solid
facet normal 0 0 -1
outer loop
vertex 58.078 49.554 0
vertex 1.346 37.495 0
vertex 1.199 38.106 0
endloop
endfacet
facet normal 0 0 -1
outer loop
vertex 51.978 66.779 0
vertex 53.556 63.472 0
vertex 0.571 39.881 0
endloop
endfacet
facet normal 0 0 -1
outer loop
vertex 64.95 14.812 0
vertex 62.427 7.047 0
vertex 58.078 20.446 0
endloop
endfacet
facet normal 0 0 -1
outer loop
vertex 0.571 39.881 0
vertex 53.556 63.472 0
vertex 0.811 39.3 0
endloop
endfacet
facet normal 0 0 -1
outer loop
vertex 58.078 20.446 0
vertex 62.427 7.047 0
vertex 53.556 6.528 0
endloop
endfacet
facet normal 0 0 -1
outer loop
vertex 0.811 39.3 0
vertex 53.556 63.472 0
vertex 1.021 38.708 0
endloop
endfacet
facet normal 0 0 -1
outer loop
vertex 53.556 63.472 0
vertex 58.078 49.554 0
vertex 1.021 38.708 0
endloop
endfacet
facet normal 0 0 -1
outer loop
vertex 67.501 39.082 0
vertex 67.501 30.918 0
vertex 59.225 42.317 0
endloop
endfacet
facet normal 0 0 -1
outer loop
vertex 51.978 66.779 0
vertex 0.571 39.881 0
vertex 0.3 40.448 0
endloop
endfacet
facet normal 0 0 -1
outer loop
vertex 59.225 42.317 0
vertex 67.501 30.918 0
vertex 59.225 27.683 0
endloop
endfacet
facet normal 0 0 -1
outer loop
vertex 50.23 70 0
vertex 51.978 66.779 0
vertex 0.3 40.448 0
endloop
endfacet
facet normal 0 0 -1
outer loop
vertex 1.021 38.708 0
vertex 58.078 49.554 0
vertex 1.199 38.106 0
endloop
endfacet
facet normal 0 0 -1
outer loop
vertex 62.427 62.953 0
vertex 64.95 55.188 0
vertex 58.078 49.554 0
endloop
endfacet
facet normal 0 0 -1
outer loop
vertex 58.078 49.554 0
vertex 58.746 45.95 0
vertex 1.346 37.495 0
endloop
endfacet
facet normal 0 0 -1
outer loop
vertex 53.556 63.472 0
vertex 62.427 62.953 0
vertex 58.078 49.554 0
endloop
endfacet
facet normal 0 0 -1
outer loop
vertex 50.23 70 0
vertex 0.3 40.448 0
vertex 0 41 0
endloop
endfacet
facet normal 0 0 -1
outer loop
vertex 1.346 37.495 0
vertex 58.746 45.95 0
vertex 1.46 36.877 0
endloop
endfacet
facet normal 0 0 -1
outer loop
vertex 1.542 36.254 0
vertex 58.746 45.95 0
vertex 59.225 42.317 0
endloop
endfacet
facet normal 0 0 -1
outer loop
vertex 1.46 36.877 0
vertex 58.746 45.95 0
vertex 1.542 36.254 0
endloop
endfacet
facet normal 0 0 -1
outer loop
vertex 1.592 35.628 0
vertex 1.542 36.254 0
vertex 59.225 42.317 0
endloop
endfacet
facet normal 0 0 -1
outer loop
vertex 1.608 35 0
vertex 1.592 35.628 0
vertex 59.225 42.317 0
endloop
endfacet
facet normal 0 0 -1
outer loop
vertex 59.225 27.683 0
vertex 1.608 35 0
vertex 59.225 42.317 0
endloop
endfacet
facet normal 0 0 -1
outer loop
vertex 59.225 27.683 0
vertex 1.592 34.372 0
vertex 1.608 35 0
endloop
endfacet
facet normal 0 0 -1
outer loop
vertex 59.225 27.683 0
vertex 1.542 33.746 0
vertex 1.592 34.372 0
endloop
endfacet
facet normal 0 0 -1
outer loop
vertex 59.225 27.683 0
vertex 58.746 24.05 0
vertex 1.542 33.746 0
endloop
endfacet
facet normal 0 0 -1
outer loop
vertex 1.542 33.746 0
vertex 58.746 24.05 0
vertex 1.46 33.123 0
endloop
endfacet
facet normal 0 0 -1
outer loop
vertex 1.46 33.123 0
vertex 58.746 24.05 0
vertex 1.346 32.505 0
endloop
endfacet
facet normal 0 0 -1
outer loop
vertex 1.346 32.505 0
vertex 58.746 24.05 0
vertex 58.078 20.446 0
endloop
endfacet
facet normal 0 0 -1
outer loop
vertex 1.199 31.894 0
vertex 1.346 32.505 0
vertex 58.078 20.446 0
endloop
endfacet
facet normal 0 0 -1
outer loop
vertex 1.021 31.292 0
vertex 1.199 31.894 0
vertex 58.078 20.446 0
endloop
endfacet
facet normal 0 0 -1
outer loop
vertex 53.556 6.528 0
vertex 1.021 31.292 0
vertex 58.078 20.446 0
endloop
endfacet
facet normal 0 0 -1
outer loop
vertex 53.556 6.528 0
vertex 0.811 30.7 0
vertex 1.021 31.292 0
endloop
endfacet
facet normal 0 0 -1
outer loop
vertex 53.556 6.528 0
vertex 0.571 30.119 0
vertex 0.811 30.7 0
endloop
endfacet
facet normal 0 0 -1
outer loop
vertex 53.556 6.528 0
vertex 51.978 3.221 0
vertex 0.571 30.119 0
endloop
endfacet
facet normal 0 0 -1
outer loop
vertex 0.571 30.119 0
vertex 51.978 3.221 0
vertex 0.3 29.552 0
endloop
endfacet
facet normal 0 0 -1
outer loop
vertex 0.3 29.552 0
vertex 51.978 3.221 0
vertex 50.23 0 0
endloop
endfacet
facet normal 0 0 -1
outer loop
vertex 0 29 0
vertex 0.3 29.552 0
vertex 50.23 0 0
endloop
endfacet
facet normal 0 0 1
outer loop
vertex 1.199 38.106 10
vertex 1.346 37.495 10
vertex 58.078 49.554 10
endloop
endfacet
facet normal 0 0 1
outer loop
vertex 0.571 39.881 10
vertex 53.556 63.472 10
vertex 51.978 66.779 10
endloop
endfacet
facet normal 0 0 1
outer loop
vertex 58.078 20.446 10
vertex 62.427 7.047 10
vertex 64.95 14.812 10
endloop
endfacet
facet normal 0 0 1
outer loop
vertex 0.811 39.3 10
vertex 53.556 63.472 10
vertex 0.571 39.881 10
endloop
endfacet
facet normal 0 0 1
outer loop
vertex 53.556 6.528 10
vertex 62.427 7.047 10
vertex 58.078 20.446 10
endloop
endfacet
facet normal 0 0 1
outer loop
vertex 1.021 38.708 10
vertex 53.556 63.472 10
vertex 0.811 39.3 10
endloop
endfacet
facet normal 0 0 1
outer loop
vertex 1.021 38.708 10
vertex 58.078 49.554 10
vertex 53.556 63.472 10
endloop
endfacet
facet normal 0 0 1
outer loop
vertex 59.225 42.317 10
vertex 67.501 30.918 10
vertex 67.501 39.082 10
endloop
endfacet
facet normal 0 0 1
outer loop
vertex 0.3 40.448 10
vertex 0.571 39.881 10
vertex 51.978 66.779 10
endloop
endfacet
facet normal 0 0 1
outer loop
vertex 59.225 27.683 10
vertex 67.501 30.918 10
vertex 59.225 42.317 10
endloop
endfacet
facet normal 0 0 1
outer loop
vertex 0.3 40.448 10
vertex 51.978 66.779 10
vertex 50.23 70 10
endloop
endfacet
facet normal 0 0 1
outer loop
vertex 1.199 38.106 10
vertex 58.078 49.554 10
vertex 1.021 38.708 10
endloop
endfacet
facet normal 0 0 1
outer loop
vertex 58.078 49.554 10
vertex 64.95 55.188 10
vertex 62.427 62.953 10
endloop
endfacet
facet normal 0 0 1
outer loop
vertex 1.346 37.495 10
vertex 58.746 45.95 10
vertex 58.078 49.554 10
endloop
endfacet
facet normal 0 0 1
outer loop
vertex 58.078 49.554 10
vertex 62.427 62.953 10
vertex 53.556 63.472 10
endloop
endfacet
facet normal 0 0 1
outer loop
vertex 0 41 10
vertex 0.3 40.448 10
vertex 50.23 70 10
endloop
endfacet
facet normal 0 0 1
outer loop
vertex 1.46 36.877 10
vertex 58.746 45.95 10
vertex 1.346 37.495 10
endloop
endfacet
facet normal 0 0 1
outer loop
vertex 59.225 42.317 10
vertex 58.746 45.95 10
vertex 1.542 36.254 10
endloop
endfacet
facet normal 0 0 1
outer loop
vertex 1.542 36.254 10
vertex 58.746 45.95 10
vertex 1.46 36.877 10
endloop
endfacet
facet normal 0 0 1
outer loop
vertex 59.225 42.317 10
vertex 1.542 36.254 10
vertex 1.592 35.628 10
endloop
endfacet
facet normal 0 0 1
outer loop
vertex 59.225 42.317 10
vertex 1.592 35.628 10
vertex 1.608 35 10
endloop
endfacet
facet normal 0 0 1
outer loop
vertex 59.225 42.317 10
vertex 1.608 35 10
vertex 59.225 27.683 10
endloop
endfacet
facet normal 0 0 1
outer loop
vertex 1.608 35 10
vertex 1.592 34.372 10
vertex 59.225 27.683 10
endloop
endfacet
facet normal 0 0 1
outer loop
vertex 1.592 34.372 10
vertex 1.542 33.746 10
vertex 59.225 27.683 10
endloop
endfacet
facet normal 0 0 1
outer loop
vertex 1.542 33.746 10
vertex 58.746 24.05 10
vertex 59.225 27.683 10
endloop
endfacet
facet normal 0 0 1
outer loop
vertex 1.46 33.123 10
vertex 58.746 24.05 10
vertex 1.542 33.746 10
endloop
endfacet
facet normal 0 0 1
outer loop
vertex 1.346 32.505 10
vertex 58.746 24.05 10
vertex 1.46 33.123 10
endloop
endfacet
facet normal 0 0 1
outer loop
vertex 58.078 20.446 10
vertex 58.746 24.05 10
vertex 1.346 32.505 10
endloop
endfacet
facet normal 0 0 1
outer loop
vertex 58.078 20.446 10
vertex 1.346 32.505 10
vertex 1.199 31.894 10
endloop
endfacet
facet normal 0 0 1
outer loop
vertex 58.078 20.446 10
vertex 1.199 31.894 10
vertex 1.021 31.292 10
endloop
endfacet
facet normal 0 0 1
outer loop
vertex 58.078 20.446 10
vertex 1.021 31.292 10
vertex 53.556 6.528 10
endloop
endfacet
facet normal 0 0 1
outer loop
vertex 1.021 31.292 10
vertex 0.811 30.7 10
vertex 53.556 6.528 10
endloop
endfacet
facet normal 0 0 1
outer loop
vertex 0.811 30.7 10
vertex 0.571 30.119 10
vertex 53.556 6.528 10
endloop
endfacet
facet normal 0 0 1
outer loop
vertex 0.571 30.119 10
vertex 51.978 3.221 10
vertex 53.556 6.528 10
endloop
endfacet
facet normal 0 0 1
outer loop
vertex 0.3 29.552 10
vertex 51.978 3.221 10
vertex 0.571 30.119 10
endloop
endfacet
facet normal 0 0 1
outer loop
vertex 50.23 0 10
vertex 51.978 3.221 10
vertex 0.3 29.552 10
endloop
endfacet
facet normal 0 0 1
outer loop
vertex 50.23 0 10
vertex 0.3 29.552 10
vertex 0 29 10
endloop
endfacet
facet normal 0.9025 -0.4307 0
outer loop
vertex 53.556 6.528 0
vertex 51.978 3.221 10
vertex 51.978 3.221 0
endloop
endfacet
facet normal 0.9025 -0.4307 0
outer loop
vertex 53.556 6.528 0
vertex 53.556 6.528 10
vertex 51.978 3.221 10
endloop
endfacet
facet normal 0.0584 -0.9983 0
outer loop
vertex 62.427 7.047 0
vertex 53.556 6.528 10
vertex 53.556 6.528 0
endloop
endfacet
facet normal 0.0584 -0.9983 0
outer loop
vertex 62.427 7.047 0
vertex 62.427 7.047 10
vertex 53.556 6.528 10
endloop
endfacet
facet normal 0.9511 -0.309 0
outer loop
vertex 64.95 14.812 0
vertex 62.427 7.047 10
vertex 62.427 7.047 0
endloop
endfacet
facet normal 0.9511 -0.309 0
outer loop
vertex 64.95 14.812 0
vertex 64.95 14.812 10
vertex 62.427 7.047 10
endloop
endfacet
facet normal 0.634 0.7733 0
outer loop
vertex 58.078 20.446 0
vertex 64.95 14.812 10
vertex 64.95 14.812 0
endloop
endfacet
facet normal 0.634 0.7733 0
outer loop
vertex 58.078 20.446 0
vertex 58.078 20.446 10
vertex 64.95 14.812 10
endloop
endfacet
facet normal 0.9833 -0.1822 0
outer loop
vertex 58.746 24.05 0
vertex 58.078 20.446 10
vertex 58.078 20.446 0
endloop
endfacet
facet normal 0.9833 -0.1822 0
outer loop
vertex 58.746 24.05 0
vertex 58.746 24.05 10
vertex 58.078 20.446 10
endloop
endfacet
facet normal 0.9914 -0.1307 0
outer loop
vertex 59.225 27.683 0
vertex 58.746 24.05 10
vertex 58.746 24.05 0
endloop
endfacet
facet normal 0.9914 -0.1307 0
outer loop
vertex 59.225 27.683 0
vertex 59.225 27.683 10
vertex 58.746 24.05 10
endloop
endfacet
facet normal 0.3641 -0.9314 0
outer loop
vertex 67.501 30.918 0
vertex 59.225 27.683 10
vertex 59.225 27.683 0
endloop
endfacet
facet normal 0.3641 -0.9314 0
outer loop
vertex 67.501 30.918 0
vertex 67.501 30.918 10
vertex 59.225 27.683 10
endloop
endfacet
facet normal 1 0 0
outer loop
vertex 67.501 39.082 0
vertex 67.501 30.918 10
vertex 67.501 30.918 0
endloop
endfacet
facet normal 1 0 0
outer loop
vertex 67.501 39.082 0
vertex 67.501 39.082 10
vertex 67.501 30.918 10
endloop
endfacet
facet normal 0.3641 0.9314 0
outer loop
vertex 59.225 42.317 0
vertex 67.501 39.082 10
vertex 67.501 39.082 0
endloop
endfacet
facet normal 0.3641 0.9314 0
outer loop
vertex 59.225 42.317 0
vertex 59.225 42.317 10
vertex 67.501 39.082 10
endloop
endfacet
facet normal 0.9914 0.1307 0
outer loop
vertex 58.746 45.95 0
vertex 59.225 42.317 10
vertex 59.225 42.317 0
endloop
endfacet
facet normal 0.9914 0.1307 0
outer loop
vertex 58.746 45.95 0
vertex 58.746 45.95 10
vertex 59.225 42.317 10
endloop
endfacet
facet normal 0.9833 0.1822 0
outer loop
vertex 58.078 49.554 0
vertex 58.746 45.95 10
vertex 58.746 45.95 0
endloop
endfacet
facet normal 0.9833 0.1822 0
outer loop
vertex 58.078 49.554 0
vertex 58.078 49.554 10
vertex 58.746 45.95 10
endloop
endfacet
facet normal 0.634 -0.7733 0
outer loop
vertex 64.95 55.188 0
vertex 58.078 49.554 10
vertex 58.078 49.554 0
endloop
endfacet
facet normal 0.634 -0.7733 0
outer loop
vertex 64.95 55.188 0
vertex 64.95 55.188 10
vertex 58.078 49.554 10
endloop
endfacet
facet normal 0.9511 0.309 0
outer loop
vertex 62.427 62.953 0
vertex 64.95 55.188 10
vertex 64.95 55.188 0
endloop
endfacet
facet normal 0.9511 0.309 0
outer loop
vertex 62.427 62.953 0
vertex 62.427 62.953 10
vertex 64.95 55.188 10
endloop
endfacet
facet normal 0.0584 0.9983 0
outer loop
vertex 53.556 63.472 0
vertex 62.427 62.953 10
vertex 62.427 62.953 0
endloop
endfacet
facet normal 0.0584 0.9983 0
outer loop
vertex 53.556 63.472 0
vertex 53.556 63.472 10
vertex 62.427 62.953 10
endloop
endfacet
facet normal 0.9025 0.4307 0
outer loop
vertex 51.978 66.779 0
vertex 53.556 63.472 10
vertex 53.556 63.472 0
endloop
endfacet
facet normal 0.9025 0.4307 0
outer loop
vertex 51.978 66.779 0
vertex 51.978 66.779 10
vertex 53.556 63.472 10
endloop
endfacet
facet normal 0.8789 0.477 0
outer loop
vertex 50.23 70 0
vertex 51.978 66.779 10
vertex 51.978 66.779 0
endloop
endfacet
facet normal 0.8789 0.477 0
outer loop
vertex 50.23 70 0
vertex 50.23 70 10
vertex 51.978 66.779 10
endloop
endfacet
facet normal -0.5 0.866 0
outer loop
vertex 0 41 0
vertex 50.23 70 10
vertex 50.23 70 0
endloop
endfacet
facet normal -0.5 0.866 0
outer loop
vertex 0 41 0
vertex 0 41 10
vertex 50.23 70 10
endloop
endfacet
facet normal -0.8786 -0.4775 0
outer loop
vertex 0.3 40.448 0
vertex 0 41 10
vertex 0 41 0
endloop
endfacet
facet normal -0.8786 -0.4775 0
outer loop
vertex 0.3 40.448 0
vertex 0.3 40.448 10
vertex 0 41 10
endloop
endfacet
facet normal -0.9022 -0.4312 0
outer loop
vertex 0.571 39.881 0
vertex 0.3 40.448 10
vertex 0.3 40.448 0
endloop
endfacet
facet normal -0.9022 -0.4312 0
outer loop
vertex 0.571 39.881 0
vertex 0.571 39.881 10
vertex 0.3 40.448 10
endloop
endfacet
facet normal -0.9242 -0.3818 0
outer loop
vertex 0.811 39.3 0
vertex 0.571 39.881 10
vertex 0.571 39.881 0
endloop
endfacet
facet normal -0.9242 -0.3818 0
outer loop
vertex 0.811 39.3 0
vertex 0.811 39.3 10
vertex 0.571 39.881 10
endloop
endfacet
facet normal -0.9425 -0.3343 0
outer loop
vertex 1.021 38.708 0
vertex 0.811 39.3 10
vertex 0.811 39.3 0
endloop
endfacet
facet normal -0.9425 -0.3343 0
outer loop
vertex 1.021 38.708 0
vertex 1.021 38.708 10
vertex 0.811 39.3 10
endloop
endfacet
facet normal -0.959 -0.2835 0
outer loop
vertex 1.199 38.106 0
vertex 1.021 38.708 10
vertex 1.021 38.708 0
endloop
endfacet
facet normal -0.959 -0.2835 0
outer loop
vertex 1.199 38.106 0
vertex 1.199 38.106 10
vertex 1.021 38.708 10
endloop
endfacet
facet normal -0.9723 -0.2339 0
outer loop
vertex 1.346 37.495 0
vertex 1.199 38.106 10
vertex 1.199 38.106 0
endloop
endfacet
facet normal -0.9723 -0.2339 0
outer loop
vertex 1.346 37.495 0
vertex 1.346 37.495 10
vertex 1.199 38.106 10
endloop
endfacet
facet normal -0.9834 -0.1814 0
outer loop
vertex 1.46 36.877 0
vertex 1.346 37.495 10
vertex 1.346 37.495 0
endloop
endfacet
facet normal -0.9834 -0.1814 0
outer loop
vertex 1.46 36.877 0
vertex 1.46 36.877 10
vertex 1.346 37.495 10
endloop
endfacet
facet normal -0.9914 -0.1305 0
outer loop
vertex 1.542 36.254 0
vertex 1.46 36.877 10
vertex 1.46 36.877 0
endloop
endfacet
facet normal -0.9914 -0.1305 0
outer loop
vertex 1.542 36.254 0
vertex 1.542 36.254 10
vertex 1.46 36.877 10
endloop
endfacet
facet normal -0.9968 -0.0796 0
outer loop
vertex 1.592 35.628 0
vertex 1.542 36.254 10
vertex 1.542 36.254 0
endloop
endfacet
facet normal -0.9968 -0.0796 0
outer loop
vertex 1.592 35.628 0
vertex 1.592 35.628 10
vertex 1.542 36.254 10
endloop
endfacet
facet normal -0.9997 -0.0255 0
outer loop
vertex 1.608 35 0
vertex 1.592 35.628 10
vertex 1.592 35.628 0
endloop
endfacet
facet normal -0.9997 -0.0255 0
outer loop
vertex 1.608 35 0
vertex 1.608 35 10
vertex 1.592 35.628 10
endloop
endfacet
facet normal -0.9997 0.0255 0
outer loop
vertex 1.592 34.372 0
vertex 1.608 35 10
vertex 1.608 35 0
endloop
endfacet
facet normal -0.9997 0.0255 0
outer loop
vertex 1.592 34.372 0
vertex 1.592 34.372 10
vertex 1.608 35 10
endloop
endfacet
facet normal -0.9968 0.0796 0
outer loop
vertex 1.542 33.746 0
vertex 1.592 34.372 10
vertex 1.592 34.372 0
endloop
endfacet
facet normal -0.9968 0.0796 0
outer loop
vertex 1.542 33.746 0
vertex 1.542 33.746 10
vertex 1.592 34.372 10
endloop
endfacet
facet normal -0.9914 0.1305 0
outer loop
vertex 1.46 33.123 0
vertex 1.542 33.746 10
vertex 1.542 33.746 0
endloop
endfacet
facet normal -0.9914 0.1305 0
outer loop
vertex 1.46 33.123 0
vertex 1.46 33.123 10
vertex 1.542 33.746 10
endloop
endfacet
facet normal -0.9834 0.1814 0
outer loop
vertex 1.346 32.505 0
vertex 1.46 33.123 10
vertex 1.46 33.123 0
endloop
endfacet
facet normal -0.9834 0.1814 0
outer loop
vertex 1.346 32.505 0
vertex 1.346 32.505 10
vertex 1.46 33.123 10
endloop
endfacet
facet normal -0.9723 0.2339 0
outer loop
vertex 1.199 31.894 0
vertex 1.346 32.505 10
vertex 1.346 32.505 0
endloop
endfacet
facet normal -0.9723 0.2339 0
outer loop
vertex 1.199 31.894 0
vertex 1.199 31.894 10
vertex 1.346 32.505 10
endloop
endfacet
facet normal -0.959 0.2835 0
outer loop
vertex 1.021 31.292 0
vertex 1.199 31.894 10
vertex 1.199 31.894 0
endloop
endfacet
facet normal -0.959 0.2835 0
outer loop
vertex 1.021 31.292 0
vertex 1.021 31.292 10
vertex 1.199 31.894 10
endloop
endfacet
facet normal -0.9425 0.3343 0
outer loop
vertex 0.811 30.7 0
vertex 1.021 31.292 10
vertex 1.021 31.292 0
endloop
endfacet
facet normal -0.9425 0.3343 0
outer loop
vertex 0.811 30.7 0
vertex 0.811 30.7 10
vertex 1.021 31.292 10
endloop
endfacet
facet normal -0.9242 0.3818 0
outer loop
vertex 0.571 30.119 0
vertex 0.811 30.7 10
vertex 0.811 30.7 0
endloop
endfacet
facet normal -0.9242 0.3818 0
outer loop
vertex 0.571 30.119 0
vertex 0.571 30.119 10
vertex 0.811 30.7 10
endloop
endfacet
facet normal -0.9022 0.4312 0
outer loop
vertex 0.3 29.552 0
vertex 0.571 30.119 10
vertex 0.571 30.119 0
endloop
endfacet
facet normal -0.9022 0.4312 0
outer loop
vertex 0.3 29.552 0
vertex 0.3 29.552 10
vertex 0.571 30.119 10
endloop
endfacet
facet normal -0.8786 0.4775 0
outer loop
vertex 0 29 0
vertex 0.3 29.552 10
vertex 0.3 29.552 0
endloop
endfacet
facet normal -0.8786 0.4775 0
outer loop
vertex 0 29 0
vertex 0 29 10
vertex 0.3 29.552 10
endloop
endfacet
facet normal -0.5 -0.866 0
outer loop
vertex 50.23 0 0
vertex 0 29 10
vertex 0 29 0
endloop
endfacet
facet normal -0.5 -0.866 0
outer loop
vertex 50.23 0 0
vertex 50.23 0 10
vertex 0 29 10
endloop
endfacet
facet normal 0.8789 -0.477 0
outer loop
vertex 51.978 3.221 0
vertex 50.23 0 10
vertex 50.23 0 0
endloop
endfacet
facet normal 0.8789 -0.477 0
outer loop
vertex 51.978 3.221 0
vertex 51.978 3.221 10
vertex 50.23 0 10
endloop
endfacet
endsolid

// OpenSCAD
$fn = 32;

// ----------------------------------------------------------------------
// Gear sector: 3 teeth on 60 degrees
// ----------------------------------------------------------------------

// --- parameters (mm) ---
sector_angle = 60;        // sector angle, degrees
root_r = 70;              // root circle radius
tooth_h = 8;              // tooth height over the root circle
teeth = 3;                // number of teeth on the sector
hub_r = 12;               // hub bore radius
plate_t = 10;             // sector thickness, Z
arc_step = 3;             // sampling step of the root/hub arcs, degrees

tip_r = root_r + tooth_h;  // tip circle radius

profile = [[50.23, 0], [51.978, 3.221], [53.556, 6.528], [62.427, 7.047], [64.95, 14.812], [58.078, 20.446], [58.746, 24.05], [59.225, 27.683], [67.501, 30.918], [67.501, 39.082], [59.225, 42.317], [58.746, 45.95], [58.078, 49.554], [64.95, 55.188], [62.427, 62.953], [53.556, 63.472], [51.978, 66.779], [50.23, 70], [0, 41], [0.3, 40.448], [0.571, 39.881], [0.811, 39.3], [1.021, 38.708], [1.199, 38.106], [1.346, 37.495], [1.46, 36.877], [1.542, 36.254], [1.592, 35.628], [1.608, 35], [1.592, 34.372], [1.542, 33.746], [1.46, 33.123], [1.346, 32.505], [1.199, 31.894], [1.021, 31.292], [0.811, 30.7], [0.571, 30.119], [0.3, 29.552], [0, 29]];  // primary outline, 39 points, counter clockwise

// --- the one profile operation ---
linear_extrude(height = plate_t) polygon(points = profile);
